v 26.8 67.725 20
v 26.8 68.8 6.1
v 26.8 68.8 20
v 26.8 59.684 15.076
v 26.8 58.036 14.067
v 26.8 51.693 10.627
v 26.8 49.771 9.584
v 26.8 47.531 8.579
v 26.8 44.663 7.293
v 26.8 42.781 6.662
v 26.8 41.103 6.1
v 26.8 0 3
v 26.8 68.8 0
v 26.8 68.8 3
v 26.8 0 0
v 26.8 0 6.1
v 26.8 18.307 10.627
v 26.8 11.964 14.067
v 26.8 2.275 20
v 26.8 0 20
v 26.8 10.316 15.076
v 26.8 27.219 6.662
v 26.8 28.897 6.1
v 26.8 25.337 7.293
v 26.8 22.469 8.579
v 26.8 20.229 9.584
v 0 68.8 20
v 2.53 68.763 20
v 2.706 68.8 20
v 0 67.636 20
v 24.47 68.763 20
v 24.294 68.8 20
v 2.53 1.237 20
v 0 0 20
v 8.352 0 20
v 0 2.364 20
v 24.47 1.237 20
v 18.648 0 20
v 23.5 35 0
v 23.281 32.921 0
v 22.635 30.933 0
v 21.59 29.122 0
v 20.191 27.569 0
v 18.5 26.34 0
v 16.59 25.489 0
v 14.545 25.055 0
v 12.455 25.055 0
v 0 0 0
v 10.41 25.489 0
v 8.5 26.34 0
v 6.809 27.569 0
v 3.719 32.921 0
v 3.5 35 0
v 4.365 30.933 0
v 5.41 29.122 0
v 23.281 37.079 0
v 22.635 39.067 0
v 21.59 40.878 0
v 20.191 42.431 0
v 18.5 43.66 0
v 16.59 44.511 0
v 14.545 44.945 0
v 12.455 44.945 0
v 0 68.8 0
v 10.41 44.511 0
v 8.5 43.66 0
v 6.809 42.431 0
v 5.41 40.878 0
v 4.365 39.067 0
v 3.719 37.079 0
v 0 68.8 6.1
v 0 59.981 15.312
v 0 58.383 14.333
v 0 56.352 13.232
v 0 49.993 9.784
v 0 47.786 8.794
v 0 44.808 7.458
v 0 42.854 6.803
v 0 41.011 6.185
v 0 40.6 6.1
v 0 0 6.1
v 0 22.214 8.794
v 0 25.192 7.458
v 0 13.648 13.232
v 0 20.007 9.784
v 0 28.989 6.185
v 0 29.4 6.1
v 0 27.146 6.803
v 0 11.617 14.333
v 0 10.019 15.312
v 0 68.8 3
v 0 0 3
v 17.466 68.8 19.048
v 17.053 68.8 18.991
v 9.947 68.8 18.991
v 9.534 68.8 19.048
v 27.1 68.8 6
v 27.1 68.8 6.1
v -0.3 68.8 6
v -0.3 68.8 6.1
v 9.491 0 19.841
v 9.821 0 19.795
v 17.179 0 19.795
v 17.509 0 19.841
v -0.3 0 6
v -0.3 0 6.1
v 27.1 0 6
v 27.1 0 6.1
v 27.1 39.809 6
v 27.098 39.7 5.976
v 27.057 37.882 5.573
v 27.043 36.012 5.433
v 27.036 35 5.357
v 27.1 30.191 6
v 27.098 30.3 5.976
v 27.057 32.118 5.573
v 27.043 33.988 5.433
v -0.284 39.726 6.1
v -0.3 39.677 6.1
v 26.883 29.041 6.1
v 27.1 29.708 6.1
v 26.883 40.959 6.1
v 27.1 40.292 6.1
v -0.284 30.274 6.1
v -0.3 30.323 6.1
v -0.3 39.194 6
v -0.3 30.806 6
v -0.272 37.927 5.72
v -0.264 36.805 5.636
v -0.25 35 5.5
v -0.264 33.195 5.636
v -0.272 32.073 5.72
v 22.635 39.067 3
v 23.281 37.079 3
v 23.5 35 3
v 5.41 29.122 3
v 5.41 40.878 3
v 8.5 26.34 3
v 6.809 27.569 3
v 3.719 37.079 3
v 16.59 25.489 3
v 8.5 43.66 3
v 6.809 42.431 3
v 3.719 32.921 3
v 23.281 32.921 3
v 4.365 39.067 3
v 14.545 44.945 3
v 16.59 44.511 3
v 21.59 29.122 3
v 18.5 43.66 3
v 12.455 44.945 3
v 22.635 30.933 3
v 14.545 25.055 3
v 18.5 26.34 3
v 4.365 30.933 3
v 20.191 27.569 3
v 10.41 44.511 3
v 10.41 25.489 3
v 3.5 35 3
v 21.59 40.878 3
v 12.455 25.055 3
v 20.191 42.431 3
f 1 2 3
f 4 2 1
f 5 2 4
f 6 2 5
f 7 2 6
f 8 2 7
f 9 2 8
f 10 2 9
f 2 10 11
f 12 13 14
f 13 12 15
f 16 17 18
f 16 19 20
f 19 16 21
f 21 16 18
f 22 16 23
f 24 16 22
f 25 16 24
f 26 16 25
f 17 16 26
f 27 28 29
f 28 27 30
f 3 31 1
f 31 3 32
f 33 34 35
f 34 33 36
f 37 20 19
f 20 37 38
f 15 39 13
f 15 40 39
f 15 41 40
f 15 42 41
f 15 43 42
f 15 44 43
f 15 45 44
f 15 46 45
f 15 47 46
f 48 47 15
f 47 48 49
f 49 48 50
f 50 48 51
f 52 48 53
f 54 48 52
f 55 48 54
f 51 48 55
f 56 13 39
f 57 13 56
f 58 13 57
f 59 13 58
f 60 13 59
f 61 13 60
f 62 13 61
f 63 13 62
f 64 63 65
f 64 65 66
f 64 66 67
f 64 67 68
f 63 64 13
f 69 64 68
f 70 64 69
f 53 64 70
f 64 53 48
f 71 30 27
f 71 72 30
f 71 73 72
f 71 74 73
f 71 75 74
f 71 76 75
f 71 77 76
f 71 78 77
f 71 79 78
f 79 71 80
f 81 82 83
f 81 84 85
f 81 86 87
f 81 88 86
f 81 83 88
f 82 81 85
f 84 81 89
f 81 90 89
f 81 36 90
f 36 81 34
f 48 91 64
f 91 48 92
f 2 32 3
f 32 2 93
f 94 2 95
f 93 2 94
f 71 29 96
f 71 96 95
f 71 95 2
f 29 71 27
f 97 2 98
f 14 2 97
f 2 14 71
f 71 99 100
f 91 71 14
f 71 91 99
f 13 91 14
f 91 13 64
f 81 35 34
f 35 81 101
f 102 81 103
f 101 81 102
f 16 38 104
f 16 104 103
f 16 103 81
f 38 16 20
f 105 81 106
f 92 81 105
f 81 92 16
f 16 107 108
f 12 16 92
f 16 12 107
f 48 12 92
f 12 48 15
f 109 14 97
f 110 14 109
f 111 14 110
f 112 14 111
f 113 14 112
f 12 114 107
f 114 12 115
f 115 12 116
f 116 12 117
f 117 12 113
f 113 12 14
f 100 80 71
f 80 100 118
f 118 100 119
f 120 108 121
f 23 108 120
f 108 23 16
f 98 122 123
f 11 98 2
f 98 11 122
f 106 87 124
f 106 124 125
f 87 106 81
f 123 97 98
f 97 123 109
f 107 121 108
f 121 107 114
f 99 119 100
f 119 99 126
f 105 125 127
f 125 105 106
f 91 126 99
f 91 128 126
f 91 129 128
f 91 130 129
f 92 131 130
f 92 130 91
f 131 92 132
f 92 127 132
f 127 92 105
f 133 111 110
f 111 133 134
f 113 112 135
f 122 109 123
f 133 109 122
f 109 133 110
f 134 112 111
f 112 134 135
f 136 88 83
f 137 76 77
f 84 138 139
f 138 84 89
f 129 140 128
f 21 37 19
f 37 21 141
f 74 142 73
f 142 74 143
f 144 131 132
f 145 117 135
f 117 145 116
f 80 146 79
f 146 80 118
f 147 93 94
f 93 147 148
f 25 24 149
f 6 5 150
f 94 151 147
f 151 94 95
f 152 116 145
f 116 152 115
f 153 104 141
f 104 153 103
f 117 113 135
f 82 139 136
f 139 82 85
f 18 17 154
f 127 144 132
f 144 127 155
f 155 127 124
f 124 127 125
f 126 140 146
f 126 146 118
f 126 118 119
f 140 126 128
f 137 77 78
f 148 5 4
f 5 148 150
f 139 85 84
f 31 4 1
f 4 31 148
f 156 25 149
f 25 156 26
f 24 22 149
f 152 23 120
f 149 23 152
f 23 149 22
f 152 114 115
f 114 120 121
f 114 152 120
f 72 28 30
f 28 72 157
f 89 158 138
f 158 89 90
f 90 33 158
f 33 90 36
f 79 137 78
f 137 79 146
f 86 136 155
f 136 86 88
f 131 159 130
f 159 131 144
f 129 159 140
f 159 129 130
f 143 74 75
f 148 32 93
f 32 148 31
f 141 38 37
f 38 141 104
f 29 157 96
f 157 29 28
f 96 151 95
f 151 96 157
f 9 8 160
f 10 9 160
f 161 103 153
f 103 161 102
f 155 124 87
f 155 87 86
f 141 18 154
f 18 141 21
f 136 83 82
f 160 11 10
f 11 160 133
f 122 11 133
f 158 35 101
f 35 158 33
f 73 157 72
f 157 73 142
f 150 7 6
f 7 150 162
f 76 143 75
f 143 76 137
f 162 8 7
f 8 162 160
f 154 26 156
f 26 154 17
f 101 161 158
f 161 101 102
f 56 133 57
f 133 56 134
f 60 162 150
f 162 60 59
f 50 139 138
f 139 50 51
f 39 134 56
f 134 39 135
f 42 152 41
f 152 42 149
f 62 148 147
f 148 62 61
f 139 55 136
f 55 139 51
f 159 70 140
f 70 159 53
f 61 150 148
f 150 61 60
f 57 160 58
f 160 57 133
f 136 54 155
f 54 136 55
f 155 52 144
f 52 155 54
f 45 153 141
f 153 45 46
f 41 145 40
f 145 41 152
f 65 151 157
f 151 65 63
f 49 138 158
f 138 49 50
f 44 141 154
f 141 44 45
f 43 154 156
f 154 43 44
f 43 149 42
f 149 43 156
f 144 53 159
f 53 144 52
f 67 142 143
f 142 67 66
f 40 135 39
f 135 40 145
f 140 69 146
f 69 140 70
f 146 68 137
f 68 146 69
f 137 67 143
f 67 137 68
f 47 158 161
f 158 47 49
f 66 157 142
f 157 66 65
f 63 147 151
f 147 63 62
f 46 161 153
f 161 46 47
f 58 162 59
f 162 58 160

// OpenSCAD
$fn=30;

/* Diffuser Lense For A Particular Project (OpenSCAD) */
tol = 0.2;

/* LED PCB */
holedia   = 16;

/* Diffuser spec */
dheight = 20;
thickness = 1.5;
standoff = 3;
holediffuser = holedia+4;

/* Camera Chamber */
camchamberw_org = 27;
camchamberh_org = 70;

camchamberw = camchamberw_org - tol;
camchamberh = camchamberh_org - tol -1;



/* Enclosure hole */
enclosurew = 19;

/* Diffuser */
difference()
{
  union()
  {
    // Body
    cube( [camchamberw,camchamberh, dheight]);

    // Grip
    translate([0, 0, standoff])
    {
      hull()
      {
        translate([0, 0, 0])
          cube([camchamberw,camchamberh,0.1], center = false);
        translate([-0.6/2, 0, standoff])
          cube([camchamberw+0.6,camchamberh,0.1], center = false);
      }
    }
  }

  translate([camchamberw_org/2,camchamberh_org/2, standoff])
    linear_extrude(height = dheight, scale=4) 
      circle(d=holediffuser);
  
  translate([camchamberw_org/2,camchamberh_org/2,0])
    linear_extrude(height = dheight) 
      circle(d=holediffuser);
}

/* Camera Frame Model */
%translate([-tol/2,-tol/2,-2])
union()
{
  %linear_extrude(height = 2) 
  {
     difference() 
    {
       offset(r = 0) 
        square(size = [camchamberw_org,camchamberh_org], center = false);
       offset(r = -2) 
        square(size = [camchamberw_org,camchamberh_org], center = false);
     }
  }
  %translate([camchamberw_org/2,camchamberh_org/2,-thickness/2])
     cylinder(thickness,d=holedia);
}
